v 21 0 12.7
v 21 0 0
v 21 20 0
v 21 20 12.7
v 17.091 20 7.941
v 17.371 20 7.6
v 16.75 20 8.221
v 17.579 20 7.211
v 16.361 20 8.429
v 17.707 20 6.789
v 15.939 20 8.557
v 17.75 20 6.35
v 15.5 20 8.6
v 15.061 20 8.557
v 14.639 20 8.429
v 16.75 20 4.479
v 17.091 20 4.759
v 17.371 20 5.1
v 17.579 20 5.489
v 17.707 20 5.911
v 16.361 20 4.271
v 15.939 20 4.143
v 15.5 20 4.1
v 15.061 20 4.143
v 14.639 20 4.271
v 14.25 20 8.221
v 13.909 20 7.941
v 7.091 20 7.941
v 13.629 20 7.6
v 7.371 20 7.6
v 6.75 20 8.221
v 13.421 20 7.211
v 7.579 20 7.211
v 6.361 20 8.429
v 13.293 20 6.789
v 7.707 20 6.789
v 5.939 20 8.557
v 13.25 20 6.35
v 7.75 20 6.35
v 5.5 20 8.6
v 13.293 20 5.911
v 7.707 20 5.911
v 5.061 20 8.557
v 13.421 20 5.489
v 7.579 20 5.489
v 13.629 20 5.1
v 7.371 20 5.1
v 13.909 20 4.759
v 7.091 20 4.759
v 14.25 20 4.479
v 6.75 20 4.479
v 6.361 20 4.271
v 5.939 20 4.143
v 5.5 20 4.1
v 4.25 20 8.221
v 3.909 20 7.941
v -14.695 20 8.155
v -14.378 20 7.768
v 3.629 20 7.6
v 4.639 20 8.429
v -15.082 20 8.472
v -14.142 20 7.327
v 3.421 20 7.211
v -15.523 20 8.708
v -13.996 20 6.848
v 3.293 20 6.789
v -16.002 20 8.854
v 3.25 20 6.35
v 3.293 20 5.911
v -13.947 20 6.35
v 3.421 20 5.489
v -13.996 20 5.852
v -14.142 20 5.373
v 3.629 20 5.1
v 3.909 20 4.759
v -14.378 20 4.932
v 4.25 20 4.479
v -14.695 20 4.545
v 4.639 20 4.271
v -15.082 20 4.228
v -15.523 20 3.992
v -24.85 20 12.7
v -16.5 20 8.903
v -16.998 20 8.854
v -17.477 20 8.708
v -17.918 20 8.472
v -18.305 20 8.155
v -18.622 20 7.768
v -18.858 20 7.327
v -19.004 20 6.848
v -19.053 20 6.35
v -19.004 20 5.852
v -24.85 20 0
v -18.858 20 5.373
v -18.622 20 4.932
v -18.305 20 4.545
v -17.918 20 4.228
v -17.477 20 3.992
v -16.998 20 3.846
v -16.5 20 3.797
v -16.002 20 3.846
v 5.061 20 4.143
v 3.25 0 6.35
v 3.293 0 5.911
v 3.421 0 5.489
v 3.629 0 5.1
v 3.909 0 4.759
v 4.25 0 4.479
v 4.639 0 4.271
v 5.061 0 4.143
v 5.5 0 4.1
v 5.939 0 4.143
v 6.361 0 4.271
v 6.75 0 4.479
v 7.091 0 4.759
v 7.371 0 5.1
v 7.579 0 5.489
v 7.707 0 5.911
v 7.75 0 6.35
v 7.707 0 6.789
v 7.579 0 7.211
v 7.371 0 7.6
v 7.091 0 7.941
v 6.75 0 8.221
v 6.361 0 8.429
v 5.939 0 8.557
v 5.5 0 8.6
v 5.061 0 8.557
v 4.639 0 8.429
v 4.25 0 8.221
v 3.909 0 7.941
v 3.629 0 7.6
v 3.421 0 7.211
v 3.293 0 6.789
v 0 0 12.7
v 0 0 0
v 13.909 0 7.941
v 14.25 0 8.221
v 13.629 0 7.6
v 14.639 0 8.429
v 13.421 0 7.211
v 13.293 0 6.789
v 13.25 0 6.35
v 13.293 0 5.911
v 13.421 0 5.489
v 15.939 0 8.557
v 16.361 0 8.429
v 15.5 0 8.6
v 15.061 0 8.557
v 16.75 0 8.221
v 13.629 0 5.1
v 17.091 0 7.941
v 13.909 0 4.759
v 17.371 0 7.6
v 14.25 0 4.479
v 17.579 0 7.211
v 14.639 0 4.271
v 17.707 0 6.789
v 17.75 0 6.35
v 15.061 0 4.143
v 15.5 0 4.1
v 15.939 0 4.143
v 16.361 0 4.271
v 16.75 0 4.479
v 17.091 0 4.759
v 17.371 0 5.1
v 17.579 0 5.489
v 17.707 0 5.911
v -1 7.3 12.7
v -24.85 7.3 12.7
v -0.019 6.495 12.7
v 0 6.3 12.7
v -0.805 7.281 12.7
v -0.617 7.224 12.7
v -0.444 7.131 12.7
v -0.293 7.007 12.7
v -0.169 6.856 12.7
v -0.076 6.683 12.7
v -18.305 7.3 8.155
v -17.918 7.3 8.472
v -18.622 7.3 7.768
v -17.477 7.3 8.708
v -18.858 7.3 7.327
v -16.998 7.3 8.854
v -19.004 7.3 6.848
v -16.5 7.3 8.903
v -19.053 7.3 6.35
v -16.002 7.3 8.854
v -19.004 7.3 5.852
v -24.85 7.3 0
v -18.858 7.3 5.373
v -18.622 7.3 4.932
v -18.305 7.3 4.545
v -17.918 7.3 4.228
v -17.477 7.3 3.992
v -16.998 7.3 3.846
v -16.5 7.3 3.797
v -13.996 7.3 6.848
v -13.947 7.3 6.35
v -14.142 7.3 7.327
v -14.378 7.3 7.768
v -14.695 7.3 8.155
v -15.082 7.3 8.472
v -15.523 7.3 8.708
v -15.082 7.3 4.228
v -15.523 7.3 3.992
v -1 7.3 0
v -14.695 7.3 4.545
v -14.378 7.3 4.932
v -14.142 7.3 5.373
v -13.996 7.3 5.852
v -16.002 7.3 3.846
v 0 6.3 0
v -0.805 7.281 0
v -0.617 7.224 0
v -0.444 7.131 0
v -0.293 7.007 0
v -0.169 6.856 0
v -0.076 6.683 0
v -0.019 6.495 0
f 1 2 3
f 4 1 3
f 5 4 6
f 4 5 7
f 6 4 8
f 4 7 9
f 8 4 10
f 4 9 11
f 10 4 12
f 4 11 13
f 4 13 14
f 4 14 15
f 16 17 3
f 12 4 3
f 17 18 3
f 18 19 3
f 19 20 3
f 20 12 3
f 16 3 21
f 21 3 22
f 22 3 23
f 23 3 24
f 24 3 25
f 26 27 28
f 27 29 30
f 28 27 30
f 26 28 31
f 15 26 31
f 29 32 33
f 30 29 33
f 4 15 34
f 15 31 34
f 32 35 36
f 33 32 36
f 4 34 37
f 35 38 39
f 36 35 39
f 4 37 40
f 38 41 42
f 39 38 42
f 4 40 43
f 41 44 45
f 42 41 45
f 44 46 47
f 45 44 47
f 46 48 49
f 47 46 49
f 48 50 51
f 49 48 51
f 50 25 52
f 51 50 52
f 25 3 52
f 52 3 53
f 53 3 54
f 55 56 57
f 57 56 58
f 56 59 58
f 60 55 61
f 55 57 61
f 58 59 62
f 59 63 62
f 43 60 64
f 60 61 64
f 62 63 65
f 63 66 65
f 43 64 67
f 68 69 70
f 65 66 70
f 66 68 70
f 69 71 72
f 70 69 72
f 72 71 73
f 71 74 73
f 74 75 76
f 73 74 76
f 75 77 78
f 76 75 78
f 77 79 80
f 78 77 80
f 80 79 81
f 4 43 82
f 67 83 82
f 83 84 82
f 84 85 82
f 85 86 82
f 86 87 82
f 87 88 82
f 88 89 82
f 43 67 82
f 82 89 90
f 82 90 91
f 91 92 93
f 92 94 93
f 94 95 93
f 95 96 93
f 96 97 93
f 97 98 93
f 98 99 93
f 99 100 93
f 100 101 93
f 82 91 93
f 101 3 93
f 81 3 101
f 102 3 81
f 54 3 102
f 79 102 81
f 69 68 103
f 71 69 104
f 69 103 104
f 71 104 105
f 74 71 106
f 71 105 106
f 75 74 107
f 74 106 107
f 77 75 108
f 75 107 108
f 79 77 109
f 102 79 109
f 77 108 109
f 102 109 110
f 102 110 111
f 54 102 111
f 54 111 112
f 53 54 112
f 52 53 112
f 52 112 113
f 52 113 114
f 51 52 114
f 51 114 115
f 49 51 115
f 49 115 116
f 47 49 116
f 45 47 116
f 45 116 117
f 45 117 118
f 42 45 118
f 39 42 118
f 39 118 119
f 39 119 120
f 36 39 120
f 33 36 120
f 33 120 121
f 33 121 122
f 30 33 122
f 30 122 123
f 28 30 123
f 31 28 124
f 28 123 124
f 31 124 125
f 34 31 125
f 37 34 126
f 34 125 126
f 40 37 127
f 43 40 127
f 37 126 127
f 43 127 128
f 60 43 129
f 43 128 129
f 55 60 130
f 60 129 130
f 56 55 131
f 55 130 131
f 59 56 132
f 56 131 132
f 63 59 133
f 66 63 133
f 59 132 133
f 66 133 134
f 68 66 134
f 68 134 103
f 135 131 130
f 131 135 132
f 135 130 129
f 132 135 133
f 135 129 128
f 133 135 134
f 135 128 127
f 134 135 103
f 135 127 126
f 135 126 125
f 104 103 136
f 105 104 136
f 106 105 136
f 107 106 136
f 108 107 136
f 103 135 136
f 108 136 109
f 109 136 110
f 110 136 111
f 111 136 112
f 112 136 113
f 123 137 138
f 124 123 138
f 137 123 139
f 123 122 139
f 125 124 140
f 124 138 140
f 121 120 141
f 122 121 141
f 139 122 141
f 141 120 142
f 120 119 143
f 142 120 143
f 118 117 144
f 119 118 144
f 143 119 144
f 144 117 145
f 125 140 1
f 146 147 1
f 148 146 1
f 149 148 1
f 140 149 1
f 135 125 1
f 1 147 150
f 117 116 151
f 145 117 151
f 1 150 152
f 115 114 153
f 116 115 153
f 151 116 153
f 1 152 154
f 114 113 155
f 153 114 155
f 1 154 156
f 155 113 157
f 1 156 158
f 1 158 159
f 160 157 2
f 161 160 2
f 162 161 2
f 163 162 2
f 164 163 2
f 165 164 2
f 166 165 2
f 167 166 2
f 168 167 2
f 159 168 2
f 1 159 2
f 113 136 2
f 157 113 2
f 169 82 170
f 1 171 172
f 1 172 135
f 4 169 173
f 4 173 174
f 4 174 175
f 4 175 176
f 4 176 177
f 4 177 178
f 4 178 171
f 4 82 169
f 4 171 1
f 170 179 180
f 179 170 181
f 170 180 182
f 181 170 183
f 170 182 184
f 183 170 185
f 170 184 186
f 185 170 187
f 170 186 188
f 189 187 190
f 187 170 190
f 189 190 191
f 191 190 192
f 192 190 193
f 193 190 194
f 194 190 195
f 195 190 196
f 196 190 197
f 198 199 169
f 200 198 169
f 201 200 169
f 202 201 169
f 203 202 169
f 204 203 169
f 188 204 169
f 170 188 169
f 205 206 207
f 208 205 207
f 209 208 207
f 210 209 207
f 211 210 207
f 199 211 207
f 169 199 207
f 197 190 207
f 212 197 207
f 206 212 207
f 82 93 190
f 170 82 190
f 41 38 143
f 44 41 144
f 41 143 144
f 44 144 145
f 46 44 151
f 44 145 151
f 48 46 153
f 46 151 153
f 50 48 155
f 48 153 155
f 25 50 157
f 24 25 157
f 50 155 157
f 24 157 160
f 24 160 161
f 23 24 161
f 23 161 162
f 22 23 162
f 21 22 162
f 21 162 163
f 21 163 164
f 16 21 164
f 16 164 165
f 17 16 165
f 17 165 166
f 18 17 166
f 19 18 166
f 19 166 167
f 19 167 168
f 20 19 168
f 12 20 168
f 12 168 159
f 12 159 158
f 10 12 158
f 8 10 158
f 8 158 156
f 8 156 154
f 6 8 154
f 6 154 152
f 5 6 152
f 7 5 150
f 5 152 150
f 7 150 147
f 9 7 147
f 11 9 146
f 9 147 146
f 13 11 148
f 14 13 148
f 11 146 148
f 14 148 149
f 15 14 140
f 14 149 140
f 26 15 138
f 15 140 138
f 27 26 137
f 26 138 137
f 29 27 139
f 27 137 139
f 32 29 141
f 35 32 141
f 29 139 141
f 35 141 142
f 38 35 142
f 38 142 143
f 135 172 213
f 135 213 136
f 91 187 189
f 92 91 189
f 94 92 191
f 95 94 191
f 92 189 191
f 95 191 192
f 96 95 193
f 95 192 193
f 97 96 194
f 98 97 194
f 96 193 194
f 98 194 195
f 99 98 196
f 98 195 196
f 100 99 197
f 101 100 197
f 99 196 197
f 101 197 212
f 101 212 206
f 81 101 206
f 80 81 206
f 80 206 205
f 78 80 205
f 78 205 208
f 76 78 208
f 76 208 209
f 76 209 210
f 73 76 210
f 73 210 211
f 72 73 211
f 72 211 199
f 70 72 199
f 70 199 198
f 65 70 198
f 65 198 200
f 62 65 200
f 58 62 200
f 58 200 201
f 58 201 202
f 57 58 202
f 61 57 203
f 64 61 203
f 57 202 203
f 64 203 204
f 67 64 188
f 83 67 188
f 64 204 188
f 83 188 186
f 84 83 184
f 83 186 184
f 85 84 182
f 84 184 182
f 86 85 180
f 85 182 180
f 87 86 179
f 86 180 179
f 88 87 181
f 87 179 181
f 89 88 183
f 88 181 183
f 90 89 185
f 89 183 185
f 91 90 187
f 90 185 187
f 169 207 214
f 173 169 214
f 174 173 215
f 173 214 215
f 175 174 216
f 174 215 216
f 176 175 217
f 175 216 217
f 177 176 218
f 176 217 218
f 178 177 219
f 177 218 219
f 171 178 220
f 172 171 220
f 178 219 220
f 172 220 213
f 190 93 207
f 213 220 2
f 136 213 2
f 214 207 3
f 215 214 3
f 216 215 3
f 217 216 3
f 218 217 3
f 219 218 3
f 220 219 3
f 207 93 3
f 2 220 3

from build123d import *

# Parameters (mm, degrees)
BOSS_EXTRUDE1_DEPTH         = 12.7
M4_CLEARANCE_HOLE1_D        = 4.5
TAP_DRILL_FOR_1_4_20_TAP1_D = 5.1054


with BuildPart() as part:
    # Sketch1 → Boss-Extrude1 (new body)
    with BuildSketch(Plane.XY):
        with BuildLine():
            Line((0, 0), (21, 0))
            Line((21, 0), (21, 20))
            Line((21, 20), (-24.85, 20))
            Line((-24.85, 20), (-24.85, 7.3))
            Line((-24.85, 7.3), (-1, 7.3))
            ThreePointArc((-1, 7.3), (-0.292893219, 7.007106781), (0, 6.3))
            Line((0, 6.3), (0, 0))
        make_face()
    extrude(amount=BOSS_EXTRUDE1_DEPTH)

    # M4 Clearance Hole1 (through all)
    with Locations(Plane(origin=(0, 20, 0), x_dir=(1, 0, 0), z_dir=(0, 1, 0))):
        with Locations((5.5, -6.35), (15.5, -6.35)):
            Hole(M4_CLEARANCE_HOLE1_D / 2)

    # Tap Drill for 1/4-20 Tap1 (through all)
    with Locations(Plane(origin=(0, 20, 0), x_dir=(1, 0, 0), z_dir=(0, 1, 0))):
        with Locations((-16.5, -6.35)):
            Hole(TAP_DRILL_FOR_1_4_20_TAP1_D / 2)


solid = part.part
